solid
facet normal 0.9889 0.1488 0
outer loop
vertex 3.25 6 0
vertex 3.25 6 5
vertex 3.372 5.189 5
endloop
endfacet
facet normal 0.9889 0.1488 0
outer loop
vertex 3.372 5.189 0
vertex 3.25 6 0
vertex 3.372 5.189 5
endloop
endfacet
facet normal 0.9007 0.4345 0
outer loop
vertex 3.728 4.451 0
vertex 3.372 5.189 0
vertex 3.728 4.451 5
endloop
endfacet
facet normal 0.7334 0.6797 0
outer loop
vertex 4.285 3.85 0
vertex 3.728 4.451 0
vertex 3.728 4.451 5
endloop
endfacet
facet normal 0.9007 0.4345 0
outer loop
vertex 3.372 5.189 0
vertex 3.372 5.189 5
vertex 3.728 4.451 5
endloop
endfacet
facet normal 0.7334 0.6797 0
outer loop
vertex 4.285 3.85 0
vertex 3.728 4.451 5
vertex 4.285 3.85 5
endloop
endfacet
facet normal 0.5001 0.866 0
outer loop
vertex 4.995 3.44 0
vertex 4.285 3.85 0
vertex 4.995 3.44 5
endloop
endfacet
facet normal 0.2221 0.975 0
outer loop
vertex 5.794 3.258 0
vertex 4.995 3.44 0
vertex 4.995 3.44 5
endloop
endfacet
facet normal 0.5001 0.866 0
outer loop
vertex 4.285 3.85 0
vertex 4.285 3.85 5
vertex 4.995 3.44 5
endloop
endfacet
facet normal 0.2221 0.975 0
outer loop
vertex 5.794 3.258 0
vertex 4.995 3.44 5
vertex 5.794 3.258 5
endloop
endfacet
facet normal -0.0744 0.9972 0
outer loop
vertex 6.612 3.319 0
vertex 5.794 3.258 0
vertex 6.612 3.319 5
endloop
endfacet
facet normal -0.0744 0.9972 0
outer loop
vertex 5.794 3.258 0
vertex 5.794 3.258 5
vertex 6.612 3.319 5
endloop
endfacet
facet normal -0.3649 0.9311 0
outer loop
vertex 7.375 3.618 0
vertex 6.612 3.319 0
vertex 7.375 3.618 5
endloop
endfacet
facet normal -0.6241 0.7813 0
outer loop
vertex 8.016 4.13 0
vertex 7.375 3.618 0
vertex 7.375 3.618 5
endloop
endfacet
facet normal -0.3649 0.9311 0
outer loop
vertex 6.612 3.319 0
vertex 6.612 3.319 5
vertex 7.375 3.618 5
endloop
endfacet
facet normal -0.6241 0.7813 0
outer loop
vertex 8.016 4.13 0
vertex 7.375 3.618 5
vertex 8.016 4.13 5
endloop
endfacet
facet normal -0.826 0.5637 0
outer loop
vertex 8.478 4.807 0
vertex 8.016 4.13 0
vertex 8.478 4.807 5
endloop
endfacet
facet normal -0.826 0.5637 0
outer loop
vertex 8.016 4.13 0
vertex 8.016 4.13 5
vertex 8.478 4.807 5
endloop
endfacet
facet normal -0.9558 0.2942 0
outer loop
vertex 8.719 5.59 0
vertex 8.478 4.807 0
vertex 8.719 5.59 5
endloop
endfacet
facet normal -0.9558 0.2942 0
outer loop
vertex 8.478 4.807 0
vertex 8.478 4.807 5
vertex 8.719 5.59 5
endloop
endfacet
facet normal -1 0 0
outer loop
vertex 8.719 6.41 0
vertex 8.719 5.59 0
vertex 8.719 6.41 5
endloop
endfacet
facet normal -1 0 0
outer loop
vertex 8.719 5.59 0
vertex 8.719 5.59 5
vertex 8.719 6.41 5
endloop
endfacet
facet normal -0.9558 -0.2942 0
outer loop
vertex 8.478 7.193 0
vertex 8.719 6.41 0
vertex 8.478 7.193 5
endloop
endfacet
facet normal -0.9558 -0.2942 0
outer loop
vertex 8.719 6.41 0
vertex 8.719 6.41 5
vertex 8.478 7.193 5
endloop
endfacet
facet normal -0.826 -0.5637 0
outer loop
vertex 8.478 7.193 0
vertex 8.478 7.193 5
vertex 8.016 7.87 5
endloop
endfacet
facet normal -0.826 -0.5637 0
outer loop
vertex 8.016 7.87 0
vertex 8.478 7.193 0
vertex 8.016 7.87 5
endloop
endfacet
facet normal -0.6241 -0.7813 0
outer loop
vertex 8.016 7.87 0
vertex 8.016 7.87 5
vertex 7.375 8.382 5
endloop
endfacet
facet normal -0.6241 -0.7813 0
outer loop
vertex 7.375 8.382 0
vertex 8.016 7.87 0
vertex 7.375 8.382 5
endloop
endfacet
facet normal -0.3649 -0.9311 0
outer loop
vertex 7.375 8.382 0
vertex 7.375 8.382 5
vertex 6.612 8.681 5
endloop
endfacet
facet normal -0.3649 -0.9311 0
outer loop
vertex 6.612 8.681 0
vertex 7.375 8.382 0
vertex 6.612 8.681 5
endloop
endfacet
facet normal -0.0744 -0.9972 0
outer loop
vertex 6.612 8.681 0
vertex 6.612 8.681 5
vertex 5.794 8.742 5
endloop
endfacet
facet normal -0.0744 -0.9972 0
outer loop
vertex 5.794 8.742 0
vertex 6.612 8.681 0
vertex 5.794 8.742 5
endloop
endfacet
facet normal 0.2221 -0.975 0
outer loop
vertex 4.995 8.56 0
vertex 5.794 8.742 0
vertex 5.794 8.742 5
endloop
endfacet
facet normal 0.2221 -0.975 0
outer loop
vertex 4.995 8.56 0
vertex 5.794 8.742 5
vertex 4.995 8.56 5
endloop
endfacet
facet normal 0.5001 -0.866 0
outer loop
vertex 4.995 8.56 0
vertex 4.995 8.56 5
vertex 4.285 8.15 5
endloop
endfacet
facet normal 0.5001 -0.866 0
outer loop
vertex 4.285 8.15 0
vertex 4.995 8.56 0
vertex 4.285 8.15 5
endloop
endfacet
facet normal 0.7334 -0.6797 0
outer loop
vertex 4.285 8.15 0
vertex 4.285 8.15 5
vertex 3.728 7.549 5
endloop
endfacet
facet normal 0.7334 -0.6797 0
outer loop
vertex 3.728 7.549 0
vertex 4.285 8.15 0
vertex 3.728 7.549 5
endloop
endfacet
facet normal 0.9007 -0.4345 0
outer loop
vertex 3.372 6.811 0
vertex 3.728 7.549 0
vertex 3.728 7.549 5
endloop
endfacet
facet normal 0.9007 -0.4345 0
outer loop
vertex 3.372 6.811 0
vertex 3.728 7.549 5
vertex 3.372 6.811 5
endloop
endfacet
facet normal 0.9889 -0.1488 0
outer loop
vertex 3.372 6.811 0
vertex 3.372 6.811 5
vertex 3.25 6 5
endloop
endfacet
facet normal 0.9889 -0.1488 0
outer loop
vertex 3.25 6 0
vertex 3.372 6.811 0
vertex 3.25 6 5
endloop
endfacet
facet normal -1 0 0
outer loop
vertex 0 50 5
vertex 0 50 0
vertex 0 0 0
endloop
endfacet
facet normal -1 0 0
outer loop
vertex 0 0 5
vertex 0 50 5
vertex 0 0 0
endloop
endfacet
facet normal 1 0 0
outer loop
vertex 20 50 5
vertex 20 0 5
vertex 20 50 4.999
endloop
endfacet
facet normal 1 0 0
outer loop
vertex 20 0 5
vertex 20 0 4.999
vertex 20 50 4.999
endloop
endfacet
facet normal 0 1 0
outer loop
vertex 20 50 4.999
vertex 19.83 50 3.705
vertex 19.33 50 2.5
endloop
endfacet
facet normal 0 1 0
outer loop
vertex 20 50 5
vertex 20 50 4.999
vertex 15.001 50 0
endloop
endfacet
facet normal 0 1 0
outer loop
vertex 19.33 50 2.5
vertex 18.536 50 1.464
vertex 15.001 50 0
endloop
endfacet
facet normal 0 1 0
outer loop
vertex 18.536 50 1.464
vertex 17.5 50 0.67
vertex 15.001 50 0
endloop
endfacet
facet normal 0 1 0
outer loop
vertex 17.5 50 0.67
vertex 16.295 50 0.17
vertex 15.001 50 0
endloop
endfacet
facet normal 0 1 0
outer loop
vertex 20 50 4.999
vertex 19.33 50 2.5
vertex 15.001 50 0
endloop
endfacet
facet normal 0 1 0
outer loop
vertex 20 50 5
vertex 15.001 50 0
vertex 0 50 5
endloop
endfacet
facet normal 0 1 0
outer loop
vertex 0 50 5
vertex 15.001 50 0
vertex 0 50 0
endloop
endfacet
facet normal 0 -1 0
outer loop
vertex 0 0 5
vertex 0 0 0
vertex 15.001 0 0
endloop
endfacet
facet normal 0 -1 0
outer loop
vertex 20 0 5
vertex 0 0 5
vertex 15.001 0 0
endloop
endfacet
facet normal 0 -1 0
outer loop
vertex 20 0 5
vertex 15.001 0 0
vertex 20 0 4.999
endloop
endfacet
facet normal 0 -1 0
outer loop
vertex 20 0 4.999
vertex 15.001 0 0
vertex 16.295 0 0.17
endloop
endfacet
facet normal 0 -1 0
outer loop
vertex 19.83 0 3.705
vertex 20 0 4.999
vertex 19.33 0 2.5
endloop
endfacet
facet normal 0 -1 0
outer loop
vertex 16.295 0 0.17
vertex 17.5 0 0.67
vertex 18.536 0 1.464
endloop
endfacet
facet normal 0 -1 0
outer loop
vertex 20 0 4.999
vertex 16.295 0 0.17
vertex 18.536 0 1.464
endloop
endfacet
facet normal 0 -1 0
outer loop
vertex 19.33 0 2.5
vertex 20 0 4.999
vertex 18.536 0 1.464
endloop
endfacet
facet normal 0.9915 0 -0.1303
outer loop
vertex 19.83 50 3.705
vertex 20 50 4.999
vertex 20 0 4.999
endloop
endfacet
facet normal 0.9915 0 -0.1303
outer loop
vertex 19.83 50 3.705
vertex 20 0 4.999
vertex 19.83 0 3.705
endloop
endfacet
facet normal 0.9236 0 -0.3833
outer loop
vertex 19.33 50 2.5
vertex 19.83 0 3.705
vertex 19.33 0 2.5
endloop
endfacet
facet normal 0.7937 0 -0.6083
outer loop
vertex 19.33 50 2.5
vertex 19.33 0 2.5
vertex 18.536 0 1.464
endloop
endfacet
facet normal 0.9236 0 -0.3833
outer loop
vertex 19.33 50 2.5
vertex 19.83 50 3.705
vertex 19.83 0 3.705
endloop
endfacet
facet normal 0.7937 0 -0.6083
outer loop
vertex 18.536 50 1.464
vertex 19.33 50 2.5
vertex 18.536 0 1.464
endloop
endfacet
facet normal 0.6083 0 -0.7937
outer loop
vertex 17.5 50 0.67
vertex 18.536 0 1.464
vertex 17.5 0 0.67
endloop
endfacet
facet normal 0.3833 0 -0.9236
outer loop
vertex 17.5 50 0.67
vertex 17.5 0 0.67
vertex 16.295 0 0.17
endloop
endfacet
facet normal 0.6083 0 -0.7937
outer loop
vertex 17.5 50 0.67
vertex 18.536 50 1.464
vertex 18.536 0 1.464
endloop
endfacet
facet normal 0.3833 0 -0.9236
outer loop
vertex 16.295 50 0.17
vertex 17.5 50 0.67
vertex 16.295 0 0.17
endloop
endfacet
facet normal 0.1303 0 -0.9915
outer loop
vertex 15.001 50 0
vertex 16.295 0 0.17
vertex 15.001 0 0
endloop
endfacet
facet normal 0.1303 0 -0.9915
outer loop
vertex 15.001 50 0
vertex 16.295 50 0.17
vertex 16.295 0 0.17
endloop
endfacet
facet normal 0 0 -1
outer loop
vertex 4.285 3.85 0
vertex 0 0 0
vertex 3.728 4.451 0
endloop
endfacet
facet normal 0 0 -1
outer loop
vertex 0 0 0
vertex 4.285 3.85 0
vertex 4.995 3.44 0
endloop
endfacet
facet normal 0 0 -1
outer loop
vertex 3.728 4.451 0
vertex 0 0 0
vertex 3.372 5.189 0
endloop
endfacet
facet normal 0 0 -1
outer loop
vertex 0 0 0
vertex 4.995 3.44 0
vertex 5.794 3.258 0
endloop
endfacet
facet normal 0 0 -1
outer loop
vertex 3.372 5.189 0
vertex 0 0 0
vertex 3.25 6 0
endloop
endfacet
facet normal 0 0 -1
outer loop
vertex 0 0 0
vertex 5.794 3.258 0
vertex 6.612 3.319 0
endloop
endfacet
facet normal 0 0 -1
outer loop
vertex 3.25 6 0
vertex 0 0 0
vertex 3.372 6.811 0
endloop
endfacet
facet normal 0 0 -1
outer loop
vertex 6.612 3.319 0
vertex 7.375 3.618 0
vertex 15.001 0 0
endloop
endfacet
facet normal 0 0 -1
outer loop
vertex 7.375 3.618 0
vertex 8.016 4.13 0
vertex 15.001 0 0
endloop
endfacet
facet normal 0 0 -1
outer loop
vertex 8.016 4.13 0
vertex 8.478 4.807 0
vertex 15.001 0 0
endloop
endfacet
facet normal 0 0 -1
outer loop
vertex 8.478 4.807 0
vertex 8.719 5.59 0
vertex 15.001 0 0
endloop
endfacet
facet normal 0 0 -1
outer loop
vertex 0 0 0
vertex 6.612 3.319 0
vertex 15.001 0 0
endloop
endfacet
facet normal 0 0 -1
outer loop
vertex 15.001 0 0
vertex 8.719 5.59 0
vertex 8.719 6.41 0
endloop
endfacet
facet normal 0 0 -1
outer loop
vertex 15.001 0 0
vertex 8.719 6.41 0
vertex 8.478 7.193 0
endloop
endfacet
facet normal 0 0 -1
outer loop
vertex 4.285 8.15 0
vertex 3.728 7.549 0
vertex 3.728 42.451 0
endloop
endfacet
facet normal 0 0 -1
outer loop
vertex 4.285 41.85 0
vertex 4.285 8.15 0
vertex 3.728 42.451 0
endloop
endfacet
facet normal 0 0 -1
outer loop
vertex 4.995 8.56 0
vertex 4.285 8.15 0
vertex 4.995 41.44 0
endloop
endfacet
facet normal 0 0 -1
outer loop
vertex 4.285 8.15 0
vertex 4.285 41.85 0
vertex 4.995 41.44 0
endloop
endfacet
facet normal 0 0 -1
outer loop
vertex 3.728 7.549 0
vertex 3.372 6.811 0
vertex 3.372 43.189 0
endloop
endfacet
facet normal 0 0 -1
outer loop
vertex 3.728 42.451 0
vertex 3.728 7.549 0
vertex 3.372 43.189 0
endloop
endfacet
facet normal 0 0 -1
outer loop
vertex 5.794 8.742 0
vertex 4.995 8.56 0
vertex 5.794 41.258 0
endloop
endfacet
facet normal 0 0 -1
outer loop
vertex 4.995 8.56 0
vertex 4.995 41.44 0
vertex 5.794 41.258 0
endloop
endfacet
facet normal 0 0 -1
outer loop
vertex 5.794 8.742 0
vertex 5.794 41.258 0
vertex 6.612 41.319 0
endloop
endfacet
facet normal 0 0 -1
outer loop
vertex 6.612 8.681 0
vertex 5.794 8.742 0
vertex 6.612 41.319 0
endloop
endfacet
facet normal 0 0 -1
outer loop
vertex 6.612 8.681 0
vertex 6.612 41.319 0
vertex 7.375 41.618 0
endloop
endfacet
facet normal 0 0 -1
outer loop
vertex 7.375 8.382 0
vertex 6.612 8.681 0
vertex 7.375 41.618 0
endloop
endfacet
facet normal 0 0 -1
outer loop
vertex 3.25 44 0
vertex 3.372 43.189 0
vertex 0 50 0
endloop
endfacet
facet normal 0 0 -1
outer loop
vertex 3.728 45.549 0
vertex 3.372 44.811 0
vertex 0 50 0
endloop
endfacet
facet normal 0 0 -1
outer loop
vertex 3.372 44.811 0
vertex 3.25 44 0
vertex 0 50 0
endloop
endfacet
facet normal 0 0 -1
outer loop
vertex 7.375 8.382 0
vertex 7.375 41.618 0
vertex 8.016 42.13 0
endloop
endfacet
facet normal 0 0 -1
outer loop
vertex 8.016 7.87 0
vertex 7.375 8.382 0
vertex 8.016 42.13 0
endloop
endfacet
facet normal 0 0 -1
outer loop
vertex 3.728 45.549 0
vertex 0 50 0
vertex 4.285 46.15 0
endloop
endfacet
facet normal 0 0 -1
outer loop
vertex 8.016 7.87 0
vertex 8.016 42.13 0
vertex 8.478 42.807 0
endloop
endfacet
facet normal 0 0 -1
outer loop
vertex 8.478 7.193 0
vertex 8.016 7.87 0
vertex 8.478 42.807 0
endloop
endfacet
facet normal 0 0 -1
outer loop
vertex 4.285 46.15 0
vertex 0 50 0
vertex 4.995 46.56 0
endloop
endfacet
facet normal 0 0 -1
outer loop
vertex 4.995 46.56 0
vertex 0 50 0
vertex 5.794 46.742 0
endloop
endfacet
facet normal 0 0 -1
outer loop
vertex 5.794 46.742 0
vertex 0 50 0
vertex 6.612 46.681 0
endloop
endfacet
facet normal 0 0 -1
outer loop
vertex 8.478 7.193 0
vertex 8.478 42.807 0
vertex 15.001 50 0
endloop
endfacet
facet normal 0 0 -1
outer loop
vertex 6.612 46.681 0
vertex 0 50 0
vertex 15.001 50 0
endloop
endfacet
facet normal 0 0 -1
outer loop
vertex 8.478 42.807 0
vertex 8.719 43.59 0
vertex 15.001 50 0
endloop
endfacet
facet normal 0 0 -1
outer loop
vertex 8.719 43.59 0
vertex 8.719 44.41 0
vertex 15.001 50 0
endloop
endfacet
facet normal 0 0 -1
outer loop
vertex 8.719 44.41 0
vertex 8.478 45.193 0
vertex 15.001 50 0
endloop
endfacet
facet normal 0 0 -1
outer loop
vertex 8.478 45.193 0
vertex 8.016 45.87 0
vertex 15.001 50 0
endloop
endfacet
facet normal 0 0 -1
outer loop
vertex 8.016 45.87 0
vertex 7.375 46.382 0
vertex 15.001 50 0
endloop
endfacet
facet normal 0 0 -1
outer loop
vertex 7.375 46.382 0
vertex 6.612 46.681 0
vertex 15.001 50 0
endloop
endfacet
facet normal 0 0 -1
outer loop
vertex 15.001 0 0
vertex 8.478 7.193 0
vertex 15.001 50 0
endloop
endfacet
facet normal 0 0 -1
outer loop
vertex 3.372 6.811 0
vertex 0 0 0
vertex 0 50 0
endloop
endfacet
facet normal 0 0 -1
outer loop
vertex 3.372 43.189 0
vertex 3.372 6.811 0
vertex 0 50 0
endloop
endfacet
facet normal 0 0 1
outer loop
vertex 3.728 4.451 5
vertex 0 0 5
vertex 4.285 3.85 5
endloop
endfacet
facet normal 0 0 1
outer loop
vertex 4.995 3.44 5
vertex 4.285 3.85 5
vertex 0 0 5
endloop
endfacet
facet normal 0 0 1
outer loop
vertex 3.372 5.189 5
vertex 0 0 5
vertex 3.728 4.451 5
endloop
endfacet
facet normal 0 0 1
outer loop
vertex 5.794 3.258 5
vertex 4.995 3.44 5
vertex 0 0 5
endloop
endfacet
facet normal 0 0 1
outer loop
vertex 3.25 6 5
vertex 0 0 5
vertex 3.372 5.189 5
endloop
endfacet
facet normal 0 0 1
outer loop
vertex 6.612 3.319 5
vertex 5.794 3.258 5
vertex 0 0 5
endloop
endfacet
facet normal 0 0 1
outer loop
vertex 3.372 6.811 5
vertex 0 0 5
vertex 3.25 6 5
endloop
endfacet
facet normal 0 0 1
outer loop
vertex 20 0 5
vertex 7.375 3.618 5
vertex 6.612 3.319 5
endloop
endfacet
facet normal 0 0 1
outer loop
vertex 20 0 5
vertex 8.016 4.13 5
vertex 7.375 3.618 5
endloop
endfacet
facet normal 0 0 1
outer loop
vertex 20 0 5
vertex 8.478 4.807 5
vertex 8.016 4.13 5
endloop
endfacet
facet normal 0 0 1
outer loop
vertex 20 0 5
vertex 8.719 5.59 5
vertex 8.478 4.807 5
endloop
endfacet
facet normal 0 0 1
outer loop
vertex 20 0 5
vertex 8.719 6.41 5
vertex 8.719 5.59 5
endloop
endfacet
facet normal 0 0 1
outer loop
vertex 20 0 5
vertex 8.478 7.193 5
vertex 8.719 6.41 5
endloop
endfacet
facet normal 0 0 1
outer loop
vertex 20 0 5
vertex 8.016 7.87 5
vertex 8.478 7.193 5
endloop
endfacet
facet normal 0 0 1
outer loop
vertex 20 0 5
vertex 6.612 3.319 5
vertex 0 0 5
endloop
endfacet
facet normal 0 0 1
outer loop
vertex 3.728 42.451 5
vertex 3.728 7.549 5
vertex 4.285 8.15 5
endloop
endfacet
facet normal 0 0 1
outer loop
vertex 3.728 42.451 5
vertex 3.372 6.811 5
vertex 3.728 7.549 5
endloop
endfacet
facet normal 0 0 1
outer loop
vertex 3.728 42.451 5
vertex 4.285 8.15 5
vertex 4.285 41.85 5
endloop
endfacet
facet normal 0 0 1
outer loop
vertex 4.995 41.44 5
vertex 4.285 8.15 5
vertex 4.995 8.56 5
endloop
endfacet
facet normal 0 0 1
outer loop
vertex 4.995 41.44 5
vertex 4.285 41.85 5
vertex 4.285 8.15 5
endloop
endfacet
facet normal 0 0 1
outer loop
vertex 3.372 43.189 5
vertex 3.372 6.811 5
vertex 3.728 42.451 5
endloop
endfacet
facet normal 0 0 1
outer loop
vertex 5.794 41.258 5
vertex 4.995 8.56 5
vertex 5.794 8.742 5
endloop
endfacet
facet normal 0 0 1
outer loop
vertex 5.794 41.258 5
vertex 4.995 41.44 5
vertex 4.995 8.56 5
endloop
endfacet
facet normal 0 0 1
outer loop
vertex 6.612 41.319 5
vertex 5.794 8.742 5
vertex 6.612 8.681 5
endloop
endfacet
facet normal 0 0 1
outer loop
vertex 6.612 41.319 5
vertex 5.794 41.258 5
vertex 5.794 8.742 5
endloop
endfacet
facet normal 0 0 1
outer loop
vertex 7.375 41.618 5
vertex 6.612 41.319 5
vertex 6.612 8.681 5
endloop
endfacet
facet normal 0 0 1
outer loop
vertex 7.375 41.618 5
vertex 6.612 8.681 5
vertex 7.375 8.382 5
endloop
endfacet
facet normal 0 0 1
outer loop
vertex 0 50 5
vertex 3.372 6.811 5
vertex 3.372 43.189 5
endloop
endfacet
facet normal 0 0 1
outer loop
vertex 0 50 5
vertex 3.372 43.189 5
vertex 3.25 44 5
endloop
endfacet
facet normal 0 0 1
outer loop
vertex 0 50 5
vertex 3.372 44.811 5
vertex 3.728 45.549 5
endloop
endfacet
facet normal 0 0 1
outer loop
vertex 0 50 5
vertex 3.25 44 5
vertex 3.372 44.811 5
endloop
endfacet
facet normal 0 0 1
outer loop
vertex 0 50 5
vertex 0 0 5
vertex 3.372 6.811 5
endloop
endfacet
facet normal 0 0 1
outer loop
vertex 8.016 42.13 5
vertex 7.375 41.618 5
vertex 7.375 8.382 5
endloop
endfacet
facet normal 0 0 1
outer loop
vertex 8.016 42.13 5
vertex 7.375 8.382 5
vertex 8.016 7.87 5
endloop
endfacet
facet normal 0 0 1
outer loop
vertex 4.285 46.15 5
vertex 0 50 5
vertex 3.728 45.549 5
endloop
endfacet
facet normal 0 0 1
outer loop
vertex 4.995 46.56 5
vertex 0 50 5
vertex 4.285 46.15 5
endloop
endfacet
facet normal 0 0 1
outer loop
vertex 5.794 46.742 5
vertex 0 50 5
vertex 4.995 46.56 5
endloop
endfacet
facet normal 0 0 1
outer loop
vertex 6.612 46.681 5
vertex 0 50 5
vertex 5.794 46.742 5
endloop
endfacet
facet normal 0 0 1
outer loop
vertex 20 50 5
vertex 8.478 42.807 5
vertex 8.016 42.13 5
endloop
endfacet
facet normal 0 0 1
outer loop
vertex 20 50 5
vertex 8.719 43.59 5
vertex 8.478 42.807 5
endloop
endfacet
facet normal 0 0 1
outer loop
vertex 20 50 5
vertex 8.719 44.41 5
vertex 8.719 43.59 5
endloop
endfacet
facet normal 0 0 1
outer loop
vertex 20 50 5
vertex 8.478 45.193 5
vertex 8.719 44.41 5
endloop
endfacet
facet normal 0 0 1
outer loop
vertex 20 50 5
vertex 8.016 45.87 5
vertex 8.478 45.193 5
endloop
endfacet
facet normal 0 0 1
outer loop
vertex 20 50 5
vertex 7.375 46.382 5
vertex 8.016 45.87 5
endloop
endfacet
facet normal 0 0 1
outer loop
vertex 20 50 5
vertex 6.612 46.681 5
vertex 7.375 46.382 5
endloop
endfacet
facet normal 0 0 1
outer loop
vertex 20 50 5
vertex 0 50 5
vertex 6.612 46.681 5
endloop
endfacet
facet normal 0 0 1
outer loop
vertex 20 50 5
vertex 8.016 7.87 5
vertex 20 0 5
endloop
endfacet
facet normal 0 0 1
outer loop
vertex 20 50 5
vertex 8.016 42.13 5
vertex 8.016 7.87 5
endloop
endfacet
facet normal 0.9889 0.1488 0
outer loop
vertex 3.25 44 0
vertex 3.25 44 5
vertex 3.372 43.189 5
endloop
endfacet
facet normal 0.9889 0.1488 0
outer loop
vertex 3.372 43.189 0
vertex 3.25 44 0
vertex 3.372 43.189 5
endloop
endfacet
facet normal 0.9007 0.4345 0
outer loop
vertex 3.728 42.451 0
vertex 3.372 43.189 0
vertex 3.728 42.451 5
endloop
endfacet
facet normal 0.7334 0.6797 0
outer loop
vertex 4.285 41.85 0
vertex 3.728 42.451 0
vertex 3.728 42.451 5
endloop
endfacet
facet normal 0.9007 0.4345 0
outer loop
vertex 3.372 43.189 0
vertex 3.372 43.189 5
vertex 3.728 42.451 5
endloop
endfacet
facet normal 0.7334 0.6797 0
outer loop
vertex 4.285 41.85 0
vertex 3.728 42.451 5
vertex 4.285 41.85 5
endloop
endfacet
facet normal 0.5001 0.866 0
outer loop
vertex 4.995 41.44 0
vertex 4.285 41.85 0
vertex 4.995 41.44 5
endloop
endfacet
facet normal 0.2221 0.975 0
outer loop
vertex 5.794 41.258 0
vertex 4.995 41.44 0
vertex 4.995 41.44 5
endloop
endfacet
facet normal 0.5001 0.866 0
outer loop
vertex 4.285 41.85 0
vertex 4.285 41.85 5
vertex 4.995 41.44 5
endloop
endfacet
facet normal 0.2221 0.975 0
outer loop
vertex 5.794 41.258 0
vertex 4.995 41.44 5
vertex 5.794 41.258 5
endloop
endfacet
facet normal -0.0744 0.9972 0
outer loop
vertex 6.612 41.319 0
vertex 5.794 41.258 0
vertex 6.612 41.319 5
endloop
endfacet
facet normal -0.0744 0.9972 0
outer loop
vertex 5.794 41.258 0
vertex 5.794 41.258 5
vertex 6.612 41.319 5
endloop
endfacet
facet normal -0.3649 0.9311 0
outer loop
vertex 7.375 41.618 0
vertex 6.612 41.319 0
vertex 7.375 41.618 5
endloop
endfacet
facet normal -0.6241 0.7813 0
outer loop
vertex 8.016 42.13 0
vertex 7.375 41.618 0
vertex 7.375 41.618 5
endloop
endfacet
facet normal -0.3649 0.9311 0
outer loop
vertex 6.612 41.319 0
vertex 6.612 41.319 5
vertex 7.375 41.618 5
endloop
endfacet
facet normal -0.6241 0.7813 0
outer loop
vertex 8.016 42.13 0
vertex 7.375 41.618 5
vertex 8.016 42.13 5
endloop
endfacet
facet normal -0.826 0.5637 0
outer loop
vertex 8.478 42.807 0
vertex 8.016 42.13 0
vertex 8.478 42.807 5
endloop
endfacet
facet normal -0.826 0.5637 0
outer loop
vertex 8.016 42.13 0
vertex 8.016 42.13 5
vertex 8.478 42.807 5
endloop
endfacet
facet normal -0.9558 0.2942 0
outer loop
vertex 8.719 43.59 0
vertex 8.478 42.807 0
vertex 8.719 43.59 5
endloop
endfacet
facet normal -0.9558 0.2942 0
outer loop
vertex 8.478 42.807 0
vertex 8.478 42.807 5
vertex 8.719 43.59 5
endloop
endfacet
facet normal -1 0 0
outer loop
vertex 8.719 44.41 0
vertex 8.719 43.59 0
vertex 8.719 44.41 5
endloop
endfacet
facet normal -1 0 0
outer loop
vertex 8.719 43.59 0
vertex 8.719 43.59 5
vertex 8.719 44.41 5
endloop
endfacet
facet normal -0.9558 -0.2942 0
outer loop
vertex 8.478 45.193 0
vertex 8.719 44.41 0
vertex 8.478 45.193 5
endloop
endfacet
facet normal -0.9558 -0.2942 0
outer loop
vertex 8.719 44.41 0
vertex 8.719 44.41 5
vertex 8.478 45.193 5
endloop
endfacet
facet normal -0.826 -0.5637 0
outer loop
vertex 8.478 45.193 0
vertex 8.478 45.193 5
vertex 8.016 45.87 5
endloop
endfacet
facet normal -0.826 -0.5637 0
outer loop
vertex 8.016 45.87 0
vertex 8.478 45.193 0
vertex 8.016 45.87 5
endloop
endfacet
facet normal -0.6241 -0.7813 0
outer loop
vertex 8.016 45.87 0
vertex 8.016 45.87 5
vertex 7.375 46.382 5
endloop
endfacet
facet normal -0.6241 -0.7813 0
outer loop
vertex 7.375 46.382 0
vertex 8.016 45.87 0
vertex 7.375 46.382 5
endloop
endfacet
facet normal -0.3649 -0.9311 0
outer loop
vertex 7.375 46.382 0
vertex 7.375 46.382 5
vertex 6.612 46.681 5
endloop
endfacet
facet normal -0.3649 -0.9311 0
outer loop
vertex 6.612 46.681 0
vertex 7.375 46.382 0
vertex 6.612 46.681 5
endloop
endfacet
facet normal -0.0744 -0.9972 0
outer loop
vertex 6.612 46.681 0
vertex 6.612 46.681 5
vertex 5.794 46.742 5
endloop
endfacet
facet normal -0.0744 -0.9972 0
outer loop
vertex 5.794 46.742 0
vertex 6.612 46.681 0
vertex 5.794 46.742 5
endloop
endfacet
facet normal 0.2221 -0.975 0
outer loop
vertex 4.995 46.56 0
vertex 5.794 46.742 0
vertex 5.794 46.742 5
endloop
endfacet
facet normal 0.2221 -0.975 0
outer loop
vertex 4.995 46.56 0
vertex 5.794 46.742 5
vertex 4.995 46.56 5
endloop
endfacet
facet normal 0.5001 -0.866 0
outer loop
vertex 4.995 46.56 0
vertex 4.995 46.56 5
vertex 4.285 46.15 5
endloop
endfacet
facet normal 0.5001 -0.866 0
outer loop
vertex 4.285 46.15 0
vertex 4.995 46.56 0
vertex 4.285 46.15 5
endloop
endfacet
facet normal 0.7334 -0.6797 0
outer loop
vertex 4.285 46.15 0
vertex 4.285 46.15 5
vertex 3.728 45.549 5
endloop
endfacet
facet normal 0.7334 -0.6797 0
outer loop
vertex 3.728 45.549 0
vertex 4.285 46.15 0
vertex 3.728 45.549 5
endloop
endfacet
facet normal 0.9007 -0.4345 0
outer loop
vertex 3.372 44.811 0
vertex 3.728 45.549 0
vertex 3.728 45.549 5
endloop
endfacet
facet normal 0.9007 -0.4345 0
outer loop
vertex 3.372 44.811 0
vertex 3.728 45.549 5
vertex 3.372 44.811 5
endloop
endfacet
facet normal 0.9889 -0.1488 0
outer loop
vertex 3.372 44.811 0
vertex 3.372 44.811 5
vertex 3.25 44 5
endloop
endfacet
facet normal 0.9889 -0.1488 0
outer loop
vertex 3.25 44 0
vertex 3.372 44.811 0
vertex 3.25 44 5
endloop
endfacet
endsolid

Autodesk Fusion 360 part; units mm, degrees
sketch "Sketch3" plane through (0, 0, 0) normal (0, 0, 1) x (1, 0, 0)
  line L0 (0, 0) -> (20, 0)
  line L1 (20, 0) -> (20, 50)
  line L2 (20, 50) -> (0, 50)
  line L3 (0, 50) -> (0, 0)
  dimension "d19" = 20
  dimension "d20" = 50
extrude "Extrude1" add sketch "Sketch3" along normal blind 5
fillet "Fillet2" radius 5 1 edges at (20, 25, 0)
sketch "Sketch7" plane through (0, 0, 5) normal (0, 0, 1) x (-1, 0, 0)
  line L0 (0, -50) -> (0, 0)
  line L1 (0, 0) -> (-20, 0)
  line L2 (-20, 0) -> (-20, -50)
  line L3 (-20, -50) -> (0, -50)
  circle A0 centre (-6, -6) radius 2.75
  circle A1 centre (-6, -44) radius 2.75
  dimension "d47" = 5.5
  dimension "d48" = 5.5
  dimension "d49" = 6
  dimension "d50" = 6
  dimension "d51" = 6
  dimension "d52" = 6
extrude "Extrude5" cut sketch "Sketch7" against normal blind 5 contours A0 | A1
